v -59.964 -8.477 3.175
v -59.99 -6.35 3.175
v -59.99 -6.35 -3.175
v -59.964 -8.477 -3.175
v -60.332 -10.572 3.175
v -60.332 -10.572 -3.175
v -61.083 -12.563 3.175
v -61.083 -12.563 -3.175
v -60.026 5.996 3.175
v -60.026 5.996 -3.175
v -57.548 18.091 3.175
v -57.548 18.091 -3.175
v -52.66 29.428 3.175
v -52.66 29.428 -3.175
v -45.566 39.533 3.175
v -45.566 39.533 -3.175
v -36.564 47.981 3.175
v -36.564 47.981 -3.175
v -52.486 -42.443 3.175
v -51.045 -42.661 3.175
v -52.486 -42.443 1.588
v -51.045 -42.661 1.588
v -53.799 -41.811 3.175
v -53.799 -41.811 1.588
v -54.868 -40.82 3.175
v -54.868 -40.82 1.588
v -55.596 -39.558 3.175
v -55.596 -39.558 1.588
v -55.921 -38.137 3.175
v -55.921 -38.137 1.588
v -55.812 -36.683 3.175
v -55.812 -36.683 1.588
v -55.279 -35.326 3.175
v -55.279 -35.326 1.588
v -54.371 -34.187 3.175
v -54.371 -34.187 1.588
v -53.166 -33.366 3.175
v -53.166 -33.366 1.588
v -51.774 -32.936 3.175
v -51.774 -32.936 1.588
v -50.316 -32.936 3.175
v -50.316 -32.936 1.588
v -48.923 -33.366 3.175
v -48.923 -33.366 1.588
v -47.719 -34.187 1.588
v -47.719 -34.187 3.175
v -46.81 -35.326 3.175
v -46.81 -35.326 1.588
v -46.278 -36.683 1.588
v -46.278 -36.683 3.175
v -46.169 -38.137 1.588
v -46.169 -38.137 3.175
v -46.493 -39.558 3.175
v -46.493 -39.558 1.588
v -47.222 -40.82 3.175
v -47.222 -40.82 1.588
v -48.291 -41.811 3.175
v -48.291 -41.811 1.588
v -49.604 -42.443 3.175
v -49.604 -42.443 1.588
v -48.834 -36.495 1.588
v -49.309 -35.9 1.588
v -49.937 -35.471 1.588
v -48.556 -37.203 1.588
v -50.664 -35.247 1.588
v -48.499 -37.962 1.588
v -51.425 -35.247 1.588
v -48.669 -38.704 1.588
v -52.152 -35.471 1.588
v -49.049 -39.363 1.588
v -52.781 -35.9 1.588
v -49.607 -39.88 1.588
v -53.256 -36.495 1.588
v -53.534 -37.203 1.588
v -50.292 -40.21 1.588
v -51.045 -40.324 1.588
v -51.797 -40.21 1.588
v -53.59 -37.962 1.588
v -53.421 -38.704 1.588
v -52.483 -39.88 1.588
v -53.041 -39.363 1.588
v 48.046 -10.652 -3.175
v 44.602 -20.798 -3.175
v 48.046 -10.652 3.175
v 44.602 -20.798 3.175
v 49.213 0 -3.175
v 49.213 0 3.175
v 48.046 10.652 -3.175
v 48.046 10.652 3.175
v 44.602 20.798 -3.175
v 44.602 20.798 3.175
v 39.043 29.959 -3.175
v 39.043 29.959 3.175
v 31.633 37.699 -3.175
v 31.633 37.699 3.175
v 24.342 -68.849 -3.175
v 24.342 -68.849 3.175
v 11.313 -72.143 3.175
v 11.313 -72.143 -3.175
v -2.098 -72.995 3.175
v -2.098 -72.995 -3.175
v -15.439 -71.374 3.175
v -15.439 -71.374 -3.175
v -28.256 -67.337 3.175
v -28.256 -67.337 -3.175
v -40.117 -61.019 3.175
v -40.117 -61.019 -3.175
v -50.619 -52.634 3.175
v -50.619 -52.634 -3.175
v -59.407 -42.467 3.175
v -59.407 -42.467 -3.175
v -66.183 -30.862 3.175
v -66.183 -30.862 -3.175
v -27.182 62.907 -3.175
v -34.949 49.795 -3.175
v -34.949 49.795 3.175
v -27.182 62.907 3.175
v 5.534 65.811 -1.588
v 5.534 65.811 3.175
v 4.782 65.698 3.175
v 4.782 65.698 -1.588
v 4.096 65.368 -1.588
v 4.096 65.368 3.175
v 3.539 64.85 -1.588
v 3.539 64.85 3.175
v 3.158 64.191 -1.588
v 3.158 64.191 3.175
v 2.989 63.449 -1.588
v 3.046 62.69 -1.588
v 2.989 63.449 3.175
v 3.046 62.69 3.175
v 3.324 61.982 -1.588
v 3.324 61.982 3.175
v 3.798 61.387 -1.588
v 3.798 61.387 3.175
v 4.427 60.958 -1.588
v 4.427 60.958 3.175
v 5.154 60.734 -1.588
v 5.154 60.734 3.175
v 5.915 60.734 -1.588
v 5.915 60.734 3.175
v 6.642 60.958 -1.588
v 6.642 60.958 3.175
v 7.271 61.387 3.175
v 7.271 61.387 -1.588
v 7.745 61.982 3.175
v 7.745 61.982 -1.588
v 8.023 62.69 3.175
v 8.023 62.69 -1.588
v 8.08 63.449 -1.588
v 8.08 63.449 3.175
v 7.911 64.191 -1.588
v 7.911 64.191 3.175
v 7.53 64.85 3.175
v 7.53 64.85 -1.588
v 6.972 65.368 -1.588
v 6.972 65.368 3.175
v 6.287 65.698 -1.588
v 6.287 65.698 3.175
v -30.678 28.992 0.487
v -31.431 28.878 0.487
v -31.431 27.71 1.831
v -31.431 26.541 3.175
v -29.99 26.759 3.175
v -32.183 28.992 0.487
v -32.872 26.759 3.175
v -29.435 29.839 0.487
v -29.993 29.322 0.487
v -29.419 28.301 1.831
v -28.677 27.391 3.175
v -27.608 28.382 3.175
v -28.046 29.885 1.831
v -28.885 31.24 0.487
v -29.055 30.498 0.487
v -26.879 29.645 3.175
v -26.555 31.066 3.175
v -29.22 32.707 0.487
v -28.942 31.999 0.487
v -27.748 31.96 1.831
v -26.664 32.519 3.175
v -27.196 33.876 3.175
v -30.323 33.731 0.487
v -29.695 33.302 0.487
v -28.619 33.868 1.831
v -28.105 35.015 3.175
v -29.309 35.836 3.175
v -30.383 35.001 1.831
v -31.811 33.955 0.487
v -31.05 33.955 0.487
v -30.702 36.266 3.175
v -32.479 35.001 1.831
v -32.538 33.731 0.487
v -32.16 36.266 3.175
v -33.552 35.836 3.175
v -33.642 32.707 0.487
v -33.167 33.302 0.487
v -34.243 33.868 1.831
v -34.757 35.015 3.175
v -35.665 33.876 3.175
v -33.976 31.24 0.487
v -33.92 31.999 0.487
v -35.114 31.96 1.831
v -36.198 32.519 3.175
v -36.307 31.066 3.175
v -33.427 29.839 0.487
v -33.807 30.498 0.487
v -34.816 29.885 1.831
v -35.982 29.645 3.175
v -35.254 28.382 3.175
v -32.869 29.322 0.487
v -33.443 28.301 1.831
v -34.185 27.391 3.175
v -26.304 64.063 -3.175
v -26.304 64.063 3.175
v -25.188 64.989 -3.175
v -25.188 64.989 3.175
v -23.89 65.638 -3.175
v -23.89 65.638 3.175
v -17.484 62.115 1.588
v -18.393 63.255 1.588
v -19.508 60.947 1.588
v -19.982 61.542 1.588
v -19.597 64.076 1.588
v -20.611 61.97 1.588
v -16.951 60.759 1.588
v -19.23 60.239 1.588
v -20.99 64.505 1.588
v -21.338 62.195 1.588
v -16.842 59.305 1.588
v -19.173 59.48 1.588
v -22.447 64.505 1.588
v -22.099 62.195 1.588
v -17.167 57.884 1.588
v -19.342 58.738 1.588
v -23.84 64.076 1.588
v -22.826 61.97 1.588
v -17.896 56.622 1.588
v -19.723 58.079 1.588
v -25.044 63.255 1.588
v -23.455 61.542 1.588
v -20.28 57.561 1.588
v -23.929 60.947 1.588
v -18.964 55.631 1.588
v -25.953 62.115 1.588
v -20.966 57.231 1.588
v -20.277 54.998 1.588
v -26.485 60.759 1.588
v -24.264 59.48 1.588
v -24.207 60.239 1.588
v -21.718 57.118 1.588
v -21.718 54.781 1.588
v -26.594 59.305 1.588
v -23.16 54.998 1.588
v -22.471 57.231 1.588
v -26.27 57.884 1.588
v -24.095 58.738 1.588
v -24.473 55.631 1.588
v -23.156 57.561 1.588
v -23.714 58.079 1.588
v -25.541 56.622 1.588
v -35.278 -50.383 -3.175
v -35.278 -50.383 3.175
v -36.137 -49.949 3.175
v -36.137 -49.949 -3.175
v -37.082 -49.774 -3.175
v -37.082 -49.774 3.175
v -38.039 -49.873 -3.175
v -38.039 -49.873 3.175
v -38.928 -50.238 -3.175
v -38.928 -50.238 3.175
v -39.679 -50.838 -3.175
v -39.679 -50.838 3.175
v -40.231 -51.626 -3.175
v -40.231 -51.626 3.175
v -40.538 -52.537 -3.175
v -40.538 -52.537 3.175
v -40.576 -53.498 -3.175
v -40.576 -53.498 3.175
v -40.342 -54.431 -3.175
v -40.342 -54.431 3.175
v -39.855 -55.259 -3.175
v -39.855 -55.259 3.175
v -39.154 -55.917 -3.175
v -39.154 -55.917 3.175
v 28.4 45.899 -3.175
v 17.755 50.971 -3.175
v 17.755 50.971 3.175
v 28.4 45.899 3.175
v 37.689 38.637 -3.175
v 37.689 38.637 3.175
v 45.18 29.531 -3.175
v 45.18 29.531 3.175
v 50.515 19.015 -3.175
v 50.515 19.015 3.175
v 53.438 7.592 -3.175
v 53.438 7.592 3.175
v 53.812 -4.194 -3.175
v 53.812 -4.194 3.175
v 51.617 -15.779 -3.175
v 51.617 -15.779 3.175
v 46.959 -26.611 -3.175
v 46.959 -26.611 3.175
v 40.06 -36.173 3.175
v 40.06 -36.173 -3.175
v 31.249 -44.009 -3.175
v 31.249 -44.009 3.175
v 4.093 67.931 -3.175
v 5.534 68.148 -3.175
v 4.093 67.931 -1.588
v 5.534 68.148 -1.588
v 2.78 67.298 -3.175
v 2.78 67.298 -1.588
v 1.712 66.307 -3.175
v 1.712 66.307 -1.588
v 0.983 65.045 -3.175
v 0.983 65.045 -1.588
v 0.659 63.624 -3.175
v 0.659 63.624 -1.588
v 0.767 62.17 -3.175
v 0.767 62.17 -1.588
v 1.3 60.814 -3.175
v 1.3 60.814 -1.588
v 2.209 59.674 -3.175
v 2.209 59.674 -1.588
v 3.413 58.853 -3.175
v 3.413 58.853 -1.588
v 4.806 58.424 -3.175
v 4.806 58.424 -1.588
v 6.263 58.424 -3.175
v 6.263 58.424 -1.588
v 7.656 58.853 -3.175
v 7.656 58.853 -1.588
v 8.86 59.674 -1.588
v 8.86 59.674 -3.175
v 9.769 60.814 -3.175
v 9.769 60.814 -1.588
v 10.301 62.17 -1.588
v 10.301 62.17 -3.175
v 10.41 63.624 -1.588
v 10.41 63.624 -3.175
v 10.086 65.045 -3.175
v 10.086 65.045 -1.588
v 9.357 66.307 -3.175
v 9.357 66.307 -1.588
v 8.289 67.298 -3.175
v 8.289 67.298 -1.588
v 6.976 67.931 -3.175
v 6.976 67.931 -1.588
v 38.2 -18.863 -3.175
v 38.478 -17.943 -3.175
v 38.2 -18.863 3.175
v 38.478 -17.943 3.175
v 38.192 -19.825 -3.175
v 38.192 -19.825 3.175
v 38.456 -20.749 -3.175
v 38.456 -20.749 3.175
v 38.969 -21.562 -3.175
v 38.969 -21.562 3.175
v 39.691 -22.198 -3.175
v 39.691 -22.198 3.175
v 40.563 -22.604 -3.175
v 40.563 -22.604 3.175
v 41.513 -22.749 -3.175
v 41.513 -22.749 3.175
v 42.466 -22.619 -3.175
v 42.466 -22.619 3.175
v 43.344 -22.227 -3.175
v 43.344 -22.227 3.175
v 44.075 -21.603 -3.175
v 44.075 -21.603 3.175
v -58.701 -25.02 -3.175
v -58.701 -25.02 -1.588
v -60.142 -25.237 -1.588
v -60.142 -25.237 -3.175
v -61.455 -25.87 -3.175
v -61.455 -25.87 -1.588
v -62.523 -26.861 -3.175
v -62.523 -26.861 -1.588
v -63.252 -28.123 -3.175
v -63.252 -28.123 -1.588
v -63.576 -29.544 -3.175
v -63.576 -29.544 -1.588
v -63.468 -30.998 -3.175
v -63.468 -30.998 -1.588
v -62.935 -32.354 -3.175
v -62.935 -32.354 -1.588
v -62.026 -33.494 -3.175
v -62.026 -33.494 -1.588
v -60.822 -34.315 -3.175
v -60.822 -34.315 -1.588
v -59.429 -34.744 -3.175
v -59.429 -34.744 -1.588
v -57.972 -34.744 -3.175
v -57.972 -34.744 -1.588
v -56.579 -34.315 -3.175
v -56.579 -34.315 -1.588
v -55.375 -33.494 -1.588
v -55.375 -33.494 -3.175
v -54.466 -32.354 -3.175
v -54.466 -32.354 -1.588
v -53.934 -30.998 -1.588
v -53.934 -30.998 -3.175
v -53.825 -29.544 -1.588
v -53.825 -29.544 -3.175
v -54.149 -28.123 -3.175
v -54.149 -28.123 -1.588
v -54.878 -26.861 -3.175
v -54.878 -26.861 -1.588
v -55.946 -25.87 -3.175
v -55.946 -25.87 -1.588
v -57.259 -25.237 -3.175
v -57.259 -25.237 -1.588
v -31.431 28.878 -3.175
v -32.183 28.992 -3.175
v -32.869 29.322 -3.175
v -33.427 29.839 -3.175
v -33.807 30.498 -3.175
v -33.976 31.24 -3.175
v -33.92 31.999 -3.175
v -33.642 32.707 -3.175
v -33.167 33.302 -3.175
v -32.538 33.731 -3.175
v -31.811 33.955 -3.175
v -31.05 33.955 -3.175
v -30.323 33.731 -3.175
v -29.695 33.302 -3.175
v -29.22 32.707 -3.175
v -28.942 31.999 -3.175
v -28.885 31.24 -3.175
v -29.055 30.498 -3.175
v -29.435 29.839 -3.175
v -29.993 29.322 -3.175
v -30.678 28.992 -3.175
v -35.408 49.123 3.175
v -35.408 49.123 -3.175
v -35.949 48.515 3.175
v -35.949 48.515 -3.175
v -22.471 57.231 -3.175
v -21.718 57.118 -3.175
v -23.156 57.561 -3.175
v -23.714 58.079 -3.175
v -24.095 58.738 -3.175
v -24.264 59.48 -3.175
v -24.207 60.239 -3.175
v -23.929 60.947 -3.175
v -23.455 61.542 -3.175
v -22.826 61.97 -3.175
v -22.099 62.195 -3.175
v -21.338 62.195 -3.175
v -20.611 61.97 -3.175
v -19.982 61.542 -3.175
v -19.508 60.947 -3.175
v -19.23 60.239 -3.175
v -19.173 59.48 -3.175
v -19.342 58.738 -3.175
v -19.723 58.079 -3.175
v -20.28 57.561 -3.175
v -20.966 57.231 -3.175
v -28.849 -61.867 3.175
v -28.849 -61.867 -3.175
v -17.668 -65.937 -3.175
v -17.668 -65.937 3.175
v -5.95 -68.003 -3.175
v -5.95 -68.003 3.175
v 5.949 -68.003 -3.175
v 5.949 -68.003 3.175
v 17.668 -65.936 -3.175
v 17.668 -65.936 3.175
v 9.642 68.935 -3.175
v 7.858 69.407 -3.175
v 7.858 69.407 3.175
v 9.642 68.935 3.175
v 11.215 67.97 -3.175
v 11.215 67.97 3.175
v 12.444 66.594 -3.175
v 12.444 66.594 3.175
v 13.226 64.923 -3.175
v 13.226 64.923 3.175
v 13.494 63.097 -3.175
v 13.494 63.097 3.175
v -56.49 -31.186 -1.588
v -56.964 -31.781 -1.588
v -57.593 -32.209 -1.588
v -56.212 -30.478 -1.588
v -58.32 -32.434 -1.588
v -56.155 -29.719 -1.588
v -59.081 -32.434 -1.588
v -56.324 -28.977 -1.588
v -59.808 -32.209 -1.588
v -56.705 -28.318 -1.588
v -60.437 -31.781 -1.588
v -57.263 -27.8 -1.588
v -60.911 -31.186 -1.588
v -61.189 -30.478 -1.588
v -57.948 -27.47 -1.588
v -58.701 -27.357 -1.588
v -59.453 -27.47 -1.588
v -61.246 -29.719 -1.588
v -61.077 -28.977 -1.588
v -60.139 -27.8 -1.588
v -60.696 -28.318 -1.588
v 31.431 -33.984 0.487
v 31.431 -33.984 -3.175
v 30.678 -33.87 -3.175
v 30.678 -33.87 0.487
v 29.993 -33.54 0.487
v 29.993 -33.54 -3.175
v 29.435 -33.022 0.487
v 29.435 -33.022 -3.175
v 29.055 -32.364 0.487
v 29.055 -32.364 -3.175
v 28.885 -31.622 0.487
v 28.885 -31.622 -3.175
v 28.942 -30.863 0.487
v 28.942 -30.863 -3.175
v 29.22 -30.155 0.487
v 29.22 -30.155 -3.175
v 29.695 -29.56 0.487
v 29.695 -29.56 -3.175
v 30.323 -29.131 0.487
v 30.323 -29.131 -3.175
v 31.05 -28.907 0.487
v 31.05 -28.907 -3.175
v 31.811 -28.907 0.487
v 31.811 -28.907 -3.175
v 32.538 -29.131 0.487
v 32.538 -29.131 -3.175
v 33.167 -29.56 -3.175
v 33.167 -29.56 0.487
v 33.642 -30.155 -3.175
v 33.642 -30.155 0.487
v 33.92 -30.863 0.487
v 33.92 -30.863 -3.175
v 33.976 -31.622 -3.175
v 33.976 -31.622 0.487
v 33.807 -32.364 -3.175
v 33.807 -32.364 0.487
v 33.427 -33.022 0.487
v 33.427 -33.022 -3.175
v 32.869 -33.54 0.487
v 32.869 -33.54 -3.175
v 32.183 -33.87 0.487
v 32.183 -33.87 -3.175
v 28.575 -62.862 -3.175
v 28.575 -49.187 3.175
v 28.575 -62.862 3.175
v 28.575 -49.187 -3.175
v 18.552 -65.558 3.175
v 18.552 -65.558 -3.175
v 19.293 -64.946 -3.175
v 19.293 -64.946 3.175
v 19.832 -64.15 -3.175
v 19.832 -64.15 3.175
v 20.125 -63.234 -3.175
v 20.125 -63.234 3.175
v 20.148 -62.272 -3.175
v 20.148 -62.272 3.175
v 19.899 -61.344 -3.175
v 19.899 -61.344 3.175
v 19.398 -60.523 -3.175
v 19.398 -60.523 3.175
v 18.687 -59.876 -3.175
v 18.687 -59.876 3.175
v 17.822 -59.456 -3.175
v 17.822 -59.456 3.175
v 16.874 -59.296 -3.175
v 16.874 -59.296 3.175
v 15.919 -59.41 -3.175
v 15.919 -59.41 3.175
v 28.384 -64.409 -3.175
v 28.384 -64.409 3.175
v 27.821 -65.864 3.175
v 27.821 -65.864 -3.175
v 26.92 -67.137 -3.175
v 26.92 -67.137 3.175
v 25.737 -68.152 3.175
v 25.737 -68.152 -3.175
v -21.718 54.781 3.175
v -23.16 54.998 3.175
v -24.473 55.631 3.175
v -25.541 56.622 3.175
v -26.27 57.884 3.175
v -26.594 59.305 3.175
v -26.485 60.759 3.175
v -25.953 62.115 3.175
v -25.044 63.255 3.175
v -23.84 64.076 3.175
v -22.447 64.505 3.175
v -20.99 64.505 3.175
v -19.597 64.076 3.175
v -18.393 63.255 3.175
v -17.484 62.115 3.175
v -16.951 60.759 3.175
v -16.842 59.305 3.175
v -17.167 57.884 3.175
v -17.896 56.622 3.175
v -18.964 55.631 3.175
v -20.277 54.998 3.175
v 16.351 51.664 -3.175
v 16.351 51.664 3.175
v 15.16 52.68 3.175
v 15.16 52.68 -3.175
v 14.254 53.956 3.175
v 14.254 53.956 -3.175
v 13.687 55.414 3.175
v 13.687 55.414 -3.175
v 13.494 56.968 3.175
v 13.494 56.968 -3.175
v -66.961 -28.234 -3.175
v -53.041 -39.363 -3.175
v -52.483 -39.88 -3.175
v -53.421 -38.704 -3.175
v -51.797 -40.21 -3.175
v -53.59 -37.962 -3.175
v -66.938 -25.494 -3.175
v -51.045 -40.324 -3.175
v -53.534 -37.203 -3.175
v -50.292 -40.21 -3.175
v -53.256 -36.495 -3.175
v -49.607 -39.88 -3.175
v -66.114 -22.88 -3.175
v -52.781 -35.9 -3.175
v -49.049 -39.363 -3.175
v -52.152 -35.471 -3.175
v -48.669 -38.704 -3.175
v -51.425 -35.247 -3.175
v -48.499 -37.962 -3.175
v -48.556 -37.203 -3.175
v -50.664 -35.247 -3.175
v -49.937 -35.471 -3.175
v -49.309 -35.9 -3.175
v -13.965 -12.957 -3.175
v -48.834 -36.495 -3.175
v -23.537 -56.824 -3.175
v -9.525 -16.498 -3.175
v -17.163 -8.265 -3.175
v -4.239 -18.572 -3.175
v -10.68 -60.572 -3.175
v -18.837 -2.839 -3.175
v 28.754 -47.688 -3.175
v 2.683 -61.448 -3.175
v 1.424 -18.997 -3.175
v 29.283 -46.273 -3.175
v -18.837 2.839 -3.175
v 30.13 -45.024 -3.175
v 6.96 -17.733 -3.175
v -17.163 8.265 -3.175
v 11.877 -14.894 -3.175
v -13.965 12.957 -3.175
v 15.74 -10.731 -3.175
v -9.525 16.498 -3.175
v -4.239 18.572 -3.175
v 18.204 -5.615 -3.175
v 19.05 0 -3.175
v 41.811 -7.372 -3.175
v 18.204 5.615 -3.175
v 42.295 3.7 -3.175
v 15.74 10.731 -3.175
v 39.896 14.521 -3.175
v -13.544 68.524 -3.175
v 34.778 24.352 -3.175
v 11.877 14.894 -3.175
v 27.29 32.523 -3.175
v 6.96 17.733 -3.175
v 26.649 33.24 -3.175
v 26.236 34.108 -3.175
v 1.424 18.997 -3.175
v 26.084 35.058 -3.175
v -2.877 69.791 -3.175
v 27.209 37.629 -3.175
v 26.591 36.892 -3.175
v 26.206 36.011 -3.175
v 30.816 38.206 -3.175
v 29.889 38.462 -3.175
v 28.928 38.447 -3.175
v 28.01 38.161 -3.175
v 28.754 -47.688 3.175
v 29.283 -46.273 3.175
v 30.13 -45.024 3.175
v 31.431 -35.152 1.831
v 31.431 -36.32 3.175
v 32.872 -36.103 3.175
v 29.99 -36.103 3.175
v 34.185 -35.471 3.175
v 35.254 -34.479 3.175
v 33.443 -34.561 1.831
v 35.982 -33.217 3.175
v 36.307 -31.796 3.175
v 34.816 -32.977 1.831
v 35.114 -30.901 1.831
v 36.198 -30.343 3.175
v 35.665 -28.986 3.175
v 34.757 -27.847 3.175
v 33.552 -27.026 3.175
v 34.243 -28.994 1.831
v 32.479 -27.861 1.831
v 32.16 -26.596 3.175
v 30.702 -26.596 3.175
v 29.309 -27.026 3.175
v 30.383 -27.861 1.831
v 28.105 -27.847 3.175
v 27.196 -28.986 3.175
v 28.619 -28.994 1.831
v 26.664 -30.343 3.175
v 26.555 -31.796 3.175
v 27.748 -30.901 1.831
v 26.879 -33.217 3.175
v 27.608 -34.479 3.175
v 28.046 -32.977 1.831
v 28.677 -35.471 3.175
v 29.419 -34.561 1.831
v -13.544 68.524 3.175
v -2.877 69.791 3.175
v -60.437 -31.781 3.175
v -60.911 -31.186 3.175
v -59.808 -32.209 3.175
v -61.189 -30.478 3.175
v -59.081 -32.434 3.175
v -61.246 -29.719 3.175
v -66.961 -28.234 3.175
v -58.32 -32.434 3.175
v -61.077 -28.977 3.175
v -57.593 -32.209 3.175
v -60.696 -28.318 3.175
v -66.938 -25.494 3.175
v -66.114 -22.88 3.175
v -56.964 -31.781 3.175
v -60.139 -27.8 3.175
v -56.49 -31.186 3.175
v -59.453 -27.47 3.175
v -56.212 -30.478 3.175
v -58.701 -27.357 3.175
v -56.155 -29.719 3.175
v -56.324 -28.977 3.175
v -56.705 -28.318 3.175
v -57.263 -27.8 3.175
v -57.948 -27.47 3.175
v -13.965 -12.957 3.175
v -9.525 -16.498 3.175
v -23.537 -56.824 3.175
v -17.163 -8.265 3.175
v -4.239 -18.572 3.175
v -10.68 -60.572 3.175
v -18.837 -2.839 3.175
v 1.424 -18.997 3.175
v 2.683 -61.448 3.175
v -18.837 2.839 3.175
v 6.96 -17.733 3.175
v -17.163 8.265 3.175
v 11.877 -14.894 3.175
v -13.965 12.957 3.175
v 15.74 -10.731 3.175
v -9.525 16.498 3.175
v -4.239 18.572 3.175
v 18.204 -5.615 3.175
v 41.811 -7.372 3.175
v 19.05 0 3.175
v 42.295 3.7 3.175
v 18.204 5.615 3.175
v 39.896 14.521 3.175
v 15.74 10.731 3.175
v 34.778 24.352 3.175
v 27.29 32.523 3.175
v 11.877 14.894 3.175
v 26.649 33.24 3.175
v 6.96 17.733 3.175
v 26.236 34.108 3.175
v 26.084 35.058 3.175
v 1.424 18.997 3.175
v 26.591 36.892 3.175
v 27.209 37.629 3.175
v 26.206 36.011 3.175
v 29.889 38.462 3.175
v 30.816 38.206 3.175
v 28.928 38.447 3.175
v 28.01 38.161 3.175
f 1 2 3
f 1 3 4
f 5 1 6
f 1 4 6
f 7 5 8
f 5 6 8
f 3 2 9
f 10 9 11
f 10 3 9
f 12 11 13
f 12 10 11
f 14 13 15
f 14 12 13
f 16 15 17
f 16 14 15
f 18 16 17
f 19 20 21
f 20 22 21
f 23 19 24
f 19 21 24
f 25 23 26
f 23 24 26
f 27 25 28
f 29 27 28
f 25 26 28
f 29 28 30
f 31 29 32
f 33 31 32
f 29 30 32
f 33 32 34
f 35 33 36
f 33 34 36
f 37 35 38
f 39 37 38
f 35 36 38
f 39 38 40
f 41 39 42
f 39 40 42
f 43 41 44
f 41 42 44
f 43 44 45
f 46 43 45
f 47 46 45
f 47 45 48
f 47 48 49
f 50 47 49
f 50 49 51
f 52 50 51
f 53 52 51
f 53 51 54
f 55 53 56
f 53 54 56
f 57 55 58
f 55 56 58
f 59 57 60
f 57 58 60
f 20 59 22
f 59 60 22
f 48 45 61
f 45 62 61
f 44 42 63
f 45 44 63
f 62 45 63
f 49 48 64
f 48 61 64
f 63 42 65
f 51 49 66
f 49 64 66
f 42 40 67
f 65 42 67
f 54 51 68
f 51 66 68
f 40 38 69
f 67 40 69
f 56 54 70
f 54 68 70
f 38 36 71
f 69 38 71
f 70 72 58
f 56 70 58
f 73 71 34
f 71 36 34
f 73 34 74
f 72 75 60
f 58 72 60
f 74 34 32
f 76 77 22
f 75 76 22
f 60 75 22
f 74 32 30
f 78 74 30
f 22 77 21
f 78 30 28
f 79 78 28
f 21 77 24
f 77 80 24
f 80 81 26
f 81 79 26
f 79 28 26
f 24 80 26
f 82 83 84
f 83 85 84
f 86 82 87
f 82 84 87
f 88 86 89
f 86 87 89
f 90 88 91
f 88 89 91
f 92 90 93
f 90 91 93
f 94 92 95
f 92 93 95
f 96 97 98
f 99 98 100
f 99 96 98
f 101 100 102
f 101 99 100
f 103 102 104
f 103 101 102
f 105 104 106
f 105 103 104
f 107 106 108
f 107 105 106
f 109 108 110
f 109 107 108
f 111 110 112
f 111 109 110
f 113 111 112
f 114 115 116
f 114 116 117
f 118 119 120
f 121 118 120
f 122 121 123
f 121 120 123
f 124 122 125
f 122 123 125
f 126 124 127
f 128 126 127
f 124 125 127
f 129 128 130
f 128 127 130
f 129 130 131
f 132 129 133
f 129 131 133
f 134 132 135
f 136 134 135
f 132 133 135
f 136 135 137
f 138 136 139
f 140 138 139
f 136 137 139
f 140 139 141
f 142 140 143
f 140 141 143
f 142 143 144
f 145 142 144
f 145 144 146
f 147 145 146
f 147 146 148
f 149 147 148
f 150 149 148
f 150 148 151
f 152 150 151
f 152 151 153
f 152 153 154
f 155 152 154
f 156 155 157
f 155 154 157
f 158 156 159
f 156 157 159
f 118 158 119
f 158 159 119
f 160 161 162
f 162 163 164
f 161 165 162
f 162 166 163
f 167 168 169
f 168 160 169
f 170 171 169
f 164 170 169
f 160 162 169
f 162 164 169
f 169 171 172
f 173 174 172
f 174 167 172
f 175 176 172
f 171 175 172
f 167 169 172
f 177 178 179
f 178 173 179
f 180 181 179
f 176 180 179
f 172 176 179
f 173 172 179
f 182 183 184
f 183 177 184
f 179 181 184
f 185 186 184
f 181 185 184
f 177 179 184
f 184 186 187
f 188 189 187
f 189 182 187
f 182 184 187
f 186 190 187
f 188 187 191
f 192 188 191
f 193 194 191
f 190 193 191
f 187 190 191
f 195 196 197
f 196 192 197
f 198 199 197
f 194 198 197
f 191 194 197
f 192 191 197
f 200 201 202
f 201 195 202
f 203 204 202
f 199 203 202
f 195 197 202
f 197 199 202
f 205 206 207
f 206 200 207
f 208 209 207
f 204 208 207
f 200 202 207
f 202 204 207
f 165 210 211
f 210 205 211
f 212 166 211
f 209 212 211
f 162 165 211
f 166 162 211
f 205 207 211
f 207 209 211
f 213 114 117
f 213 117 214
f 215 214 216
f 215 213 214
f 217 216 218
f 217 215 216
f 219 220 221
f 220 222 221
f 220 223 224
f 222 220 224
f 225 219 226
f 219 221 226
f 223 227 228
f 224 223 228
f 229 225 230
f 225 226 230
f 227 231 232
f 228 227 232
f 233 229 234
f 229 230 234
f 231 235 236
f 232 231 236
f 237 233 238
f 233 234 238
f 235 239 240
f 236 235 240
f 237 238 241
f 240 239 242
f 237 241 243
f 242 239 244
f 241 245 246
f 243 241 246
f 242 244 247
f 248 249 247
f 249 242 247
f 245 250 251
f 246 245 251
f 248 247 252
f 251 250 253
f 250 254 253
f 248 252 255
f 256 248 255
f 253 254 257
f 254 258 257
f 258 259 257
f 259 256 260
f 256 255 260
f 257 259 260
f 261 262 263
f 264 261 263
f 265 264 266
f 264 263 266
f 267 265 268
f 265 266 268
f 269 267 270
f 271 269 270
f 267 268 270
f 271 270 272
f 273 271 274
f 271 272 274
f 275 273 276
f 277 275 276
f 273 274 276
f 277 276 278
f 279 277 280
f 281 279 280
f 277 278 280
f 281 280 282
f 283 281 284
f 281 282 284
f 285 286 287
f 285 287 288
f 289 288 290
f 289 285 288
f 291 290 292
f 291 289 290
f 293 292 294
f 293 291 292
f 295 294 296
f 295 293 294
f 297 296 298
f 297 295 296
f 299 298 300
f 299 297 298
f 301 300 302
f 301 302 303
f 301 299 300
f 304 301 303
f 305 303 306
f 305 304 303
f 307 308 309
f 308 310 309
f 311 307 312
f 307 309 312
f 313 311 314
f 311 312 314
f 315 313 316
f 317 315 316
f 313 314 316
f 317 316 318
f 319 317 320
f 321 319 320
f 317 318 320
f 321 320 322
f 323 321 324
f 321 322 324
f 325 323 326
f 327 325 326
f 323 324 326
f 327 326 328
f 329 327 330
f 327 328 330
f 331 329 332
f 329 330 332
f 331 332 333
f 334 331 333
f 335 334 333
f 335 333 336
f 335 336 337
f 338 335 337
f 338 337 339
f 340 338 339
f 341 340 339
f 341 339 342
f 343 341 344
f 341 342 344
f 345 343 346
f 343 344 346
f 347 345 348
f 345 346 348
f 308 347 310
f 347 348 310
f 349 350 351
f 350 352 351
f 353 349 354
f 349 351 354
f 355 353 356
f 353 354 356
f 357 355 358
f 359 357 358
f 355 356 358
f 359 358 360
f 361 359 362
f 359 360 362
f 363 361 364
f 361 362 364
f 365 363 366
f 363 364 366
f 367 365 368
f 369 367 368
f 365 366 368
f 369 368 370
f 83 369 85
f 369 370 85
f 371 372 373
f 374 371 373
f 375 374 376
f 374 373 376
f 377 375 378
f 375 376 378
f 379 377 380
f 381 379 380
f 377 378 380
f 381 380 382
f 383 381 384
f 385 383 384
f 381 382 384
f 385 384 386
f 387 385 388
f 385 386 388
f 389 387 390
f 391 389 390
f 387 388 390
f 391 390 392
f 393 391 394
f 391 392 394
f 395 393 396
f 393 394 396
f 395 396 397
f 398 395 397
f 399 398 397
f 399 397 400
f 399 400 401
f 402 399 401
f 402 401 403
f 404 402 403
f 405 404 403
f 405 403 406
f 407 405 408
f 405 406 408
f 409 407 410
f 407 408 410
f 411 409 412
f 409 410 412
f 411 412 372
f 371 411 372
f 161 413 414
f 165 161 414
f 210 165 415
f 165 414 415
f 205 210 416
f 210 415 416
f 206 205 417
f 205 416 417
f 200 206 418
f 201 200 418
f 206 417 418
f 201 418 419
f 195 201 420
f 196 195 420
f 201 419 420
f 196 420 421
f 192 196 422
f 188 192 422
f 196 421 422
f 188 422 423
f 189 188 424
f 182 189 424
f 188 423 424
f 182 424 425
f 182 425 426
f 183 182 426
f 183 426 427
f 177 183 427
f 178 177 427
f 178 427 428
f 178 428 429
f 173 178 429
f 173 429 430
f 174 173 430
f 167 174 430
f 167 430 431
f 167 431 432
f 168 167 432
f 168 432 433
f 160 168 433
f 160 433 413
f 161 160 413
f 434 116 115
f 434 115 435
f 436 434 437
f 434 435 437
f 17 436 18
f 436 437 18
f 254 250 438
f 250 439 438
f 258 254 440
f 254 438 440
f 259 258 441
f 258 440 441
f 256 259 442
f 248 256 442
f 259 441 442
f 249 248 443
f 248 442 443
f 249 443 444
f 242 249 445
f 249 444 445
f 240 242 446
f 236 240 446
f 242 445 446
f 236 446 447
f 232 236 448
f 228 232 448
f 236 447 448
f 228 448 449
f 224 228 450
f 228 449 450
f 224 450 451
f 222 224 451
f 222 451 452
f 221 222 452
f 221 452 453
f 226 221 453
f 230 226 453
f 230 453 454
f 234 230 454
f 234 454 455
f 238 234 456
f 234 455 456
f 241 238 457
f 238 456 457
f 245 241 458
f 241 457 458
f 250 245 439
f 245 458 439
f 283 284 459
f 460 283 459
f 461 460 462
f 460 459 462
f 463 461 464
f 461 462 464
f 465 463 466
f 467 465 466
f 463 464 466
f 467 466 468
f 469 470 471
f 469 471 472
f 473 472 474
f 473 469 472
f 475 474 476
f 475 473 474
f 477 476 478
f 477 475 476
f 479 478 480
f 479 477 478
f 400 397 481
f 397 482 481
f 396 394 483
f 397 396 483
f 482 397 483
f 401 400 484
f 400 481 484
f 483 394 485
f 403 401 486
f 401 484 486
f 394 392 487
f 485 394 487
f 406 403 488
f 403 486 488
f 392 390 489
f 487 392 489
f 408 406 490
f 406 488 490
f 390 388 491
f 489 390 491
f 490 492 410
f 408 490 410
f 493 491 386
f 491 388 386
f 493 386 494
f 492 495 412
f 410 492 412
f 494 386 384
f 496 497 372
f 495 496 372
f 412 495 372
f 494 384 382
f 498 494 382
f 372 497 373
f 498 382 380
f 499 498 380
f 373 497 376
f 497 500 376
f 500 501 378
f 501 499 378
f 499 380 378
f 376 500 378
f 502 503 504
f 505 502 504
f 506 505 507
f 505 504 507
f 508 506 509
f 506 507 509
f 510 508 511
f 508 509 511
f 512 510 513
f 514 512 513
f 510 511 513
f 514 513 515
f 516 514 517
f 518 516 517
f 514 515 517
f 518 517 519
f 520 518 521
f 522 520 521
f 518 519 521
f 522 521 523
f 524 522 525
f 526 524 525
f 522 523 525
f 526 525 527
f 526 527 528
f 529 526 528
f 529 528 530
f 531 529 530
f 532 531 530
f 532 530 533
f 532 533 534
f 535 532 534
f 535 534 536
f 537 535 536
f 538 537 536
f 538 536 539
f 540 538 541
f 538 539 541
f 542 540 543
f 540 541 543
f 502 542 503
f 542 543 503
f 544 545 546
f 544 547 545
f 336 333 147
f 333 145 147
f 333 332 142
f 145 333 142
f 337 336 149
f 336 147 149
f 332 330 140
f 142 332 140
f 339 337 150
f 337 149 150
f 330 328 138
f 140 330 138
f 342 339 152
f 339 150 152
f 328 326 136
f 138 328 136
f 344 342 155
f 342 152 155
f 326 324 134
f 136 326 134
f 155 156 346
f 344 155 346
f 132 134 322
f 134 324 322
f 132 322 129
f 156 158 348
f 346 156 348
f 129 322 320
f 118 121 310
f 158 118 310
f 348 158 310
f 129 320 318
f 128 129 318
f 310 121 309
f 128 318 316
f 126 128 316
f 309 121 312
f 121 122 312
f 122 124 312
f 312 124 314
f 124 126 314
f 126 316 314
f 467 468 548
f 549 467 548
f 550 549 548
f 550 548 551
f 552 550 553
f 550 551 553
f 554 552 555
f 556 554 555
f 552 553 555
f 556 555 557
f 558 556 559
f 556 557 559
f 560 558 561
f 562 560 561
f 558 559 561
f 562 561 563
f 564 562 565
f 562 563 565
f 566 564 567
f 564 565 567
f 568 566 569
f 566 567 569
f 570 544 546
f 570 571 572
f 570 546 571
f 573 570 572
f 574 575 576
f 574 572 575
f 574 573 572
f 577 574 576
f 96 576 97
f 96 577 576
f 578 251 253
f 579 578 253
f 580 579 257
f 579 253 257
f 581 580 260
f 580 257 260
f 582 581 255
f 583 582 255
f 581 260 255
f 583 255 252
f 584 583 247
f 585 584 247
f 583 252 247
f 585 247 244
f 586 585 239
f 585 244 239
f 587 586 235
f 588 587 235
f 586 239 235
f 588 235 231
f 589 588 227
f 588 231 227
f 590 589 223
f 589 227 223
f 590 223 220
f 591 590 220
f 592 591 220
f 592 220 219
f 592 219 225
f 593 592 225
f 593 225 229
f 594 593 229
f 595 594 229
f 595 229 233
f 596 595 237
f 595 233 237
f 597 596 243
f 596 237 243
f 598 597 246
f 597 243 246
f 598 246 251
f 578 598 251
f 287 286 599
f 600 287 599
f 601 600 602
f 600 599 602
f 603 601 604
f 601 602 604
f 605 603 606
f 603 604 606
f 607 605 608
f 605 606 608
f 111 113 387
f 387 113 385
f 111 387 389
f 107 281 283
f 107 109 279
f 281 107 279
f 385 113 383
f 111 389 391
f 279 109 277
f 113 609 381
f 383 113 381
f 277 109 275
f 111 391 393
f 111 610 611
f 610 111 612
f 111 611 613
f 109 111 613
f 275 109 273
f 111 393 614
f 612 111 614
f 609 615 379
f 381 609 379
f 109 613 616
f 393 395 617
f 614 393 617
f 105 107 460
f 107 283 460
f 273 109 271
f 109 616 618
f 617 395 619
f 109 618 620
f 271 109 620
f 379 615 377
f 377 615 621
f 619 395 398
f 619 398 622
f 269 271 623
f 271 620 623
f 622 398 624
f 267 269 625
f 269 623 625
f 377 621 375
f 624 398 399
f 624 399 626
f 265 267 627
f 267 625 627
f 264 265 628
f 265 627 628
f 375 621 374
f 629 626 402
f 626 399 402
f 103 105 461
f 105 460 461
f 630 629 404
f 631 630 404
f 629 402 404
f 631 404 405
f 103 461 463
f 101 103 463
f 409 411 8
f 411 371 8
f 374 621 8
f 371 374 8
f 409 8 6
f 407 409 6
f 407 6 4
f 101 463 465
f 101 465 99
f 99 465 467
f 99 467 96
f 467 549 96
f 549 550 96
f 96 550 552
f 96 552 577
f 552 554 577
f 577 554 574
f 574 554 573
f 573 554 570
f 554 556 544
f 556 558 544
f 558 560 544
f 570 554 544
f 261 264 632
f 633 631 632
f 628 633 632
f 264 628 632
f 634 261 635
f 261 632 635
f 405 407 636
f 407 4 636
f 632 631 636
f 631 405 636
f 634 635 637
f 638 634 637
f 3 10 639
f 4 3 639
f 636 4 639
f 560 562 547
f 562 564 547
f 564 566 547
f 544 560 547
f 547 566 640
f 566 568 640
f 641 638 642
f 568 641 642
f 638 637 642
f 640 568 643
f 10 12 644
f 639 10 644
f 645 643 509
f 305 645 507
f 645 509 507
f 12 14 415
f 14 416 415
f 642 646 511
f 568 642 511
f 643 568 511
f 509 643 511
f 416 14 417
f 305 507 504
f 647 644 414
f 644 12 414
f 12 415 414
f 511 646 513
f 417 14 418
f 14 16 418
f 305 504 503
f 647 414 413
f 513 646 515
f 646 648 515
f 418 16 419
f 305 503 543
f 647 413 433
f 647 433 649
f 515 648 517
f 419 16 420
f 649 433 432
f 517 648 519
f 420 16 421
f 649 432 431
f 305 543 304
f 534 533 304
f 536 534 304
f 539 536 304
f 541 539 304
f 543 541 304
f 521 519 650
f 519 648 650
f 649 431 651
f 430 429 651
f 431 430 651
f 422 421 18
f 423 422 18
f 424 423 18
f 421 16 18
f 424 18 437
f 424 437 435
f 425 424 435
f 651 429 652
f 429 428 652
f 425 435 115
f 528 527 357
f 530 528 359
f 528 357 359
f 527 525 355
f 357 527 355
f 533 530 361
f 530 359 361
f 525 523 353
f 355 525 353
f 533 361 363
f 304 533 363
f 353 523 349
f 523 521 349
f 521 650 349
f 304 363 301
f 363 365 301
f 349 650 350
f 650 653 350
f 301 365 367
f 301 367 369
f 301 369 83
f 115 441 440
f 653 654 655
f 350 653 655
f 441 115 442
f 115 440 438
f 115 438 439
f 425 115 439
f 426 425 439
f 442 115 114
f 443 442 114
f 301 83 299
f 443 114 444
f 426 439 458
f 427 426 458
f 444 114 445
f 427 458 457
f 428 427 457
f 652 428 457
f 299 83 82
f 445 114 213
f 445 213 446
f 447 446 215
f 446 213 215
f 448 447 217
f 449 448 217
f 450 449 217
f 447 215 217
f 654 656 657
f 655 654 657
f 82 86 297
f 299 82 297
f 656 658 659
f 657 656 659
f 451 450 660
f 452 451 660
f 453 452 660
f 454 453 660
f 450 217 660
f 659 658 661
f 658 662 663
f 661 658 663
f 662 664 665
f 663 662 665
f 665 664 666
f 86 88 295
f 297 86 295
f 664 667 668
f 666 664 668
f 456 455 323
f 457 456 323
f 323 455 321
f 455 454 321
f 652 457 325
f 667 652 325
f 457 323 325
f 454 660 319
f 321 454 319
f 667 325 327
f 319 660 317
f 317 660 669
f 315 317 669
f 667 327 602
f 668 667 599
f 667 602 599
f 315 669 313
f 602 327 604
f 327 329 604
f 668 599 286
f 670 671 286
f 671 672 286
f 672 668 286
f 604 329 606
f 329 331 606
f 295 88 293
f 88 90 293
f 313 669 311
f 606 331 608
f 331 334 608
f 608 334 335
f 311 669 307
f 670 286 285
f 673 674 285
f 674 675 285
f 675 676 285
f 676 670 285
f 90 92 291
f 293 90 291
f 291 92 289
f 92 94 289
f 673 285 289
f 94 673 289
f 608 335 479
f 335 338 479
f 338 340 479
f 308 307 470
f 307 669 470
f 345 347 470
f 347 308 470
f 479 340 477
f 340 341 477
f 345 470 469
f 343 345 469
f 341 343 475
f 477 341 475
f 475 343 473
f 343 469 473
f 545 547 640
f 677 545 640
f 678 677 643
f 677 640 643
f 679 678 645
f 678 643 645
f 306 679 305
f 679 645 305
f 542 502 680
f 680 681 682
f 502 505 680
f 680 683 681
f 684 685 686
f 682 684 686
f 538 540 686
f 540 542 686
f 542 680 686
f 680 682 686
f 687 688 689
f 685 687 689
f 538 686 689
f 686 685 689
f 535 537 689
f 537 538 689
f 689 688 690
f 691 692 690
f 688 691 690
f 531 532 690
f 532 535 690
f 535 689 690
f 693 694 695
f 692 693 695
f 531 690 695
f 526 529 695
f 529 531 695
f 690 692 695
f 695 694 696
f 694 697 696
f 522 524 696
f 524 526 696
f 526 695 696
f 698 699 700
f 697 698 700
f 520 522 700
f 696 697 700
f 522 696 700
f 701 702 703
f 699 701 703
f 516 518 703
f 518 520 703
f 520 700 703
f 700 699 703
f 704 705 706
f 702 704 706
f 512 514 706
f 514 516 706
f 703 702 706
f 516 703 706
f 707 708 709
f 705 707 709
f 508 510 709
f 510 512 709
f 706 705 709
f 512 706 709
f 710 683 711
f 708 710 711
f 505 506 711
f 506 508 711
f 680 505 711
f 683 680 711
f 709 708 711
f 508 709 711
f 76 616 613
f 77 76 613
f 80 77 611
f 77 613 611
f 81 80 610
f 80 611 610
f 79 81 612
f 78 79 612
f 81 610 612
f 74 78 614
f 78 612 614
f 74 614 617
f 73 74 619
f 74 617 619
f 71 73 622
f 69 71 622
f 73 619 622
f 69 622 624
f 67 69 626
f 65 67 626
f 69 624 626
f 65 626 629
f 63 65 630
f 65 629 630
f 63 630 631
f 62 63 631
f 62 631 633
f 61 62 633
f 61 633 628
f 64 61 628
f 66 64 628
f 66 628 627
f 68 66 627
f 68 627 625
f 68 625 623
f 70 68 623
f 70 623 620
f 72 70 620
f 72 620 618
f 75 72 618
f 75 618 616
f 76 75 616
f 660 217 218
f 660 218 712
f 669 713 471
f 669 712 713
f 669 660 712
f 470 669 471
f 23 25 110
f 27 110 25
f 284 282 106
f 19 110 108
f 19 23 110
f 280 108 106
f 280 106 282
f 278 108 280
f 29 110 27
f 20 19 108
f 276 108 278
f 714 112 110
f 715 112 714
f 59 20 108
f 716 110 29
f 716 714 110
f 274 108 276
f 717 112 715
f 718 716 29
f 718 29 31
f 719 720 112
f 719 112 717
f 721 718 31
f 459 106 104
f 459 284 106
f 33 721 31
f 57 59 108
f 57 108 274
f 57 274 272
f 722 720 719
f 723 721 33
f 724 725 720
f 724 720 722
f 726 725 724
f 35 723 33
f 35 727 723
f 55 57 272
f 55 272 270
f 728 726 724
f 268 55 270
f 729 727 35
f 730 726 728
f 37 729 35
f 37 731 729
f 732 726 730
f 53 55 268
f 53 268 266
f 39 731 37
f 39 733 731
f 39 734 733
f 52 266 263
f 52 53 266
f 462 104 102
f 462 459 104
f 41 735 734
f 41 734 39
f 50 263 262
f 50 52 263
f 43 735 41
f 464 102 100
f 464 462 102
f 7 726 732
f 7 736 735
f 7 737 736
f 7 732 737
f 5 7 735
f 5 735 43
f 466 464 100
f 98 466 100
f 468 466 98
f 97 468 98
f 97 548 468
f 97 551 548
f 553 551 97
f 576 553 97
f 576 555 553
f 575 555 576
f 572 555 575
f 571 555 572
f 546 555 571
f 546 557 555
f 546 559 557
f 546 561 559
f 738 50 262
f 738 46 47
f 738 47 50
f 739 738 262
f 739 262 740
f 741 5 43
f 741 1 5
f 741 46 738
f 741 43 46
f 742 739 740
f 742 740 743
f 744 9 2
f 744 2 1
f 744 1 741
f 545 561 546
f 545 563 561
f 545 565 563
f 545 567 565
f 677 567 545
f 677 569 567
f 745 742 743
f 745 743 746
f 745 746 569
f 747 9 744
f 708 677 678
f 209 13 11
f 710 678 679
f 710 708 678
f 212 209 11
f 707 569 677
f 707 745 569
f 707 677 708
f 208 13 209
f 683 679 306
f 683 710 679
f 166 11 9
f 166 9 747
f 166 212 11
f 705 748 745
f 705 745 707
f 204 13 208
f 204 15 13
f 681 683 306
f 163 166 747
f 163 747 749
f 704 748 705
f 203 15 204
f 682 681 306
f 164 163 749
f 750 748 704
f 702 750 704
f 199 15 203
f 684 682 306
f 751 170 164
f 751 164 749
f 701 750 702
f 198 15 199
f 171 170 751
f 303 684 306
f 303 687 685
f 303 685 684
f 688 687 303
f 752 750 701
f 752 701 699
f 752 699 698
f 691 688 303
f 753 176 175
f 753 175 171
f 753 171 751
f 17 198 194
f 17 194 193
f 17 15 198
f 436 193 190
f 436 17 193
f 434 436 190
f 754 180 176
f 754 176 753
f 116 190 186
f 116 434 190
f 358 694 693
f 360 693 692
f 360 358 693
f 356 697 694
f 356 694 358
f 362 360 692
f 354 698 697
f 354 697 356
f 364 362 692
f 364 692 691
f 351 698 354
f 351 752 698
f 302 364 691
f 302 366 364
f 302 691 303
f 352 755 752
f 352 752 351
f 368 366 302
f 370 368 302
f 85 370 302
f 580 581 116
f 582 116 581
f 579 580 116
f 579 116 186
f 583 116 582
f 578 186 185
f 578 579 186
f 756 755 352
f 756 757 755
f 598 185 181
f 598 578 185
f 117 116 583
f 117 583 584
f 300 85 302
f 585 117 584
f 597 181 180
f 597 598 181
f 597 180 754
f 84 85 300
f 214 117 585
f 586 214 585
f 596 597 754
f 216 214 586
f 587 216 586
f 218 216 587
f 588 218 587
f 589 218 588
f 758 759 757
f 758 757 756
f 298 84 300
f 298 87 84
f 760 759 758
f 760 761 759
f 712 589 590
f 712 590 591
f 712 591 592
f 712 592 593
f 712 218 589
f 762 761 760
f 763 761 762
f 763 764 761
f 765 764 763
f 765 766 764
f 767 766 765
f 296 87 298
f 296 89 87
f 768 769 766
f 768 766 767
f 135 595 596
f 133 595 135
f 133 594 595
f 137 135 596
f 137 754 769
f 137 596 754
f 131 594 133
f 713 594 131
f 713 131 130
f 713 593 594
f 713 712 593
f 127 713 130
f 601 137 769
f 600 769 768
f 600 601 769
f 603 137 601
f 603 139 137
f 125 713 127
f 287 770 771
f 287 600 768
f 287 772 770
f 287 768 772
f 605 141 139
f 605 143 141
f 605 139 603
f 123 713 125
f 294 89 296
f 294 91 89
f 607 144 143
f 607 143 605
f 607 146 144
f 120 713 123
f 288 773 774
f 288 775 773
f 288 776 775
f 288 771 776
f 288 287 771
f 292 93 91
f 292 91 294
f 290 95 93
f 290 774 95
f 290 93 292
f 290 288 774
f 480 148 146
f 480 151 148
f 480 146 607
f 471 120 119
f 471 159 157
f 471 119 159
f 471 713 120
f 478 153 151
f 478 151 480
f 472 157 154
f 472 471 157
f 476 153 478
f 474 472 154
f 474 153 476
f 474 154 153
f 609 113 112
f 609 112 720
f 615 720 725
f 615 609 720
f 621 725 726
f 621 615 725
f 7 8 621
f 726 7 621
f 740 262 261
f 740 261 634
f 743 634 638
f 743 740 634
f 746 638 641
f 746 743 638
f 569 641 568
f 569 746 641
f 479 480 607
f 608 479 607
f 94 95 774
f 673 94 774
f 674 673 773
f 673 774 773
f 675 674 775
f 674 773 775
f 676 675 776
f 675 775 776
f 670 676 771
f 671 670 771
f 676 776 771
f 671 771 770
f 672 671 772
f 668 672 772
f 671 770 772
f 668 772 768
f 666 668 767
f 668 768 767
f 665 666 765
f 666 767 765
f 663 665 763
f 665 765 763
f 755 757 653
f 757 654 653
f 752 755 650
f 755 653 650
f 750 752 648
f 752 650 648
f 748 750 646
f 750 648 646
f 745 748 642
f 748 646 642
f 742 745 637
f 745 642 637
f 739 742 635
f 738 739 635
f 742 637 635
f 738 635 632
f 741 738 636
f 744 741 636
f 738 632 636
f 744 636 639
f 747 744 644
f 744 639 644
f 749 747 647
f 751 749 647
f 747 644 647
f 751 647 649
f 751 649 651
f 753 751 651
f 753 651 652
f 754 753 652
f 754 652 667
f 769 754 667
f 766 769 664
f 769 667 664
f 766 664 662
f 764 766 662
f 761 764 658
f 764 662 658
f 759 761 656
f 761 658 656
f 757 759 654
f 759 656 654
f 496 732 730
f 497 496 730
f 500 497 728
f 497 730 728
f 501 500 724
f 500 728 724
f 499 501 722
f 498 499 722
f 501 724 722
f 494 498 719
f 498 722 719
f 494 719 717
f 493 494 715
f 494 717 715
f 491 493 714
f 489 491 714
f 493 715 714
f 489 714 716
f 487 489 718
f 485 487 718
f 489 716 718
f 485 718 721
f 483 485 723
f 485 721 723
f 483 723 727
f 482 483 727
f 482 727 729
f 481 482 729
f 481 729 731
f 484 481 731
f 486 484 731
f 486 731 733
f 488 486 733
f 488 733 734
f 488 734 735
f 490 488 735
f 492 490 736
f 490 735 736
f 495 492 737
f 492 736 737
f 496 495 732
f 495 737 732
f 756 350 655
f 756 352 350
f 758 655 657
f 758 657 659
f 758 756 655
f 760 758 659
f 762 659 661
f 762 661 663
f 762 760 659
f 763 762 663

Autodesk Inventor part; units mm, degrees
ref_plane "YZ Plane" through (0, 0, 0) normal (1, 0, 0) x (0, 1, 0)
ref_plane "XZ Plane" through (0, 0, 0) normal (0, 1, 0) x (-1, 0, 0)
ref_plane "XY Plane" through (0, 0, 0) normal (0, 0, 1) x (1, 0, 0)
sketch "Sketch1" plane through (0, 0, 0) normal (0, 0, 1) x (1, 0, 0)
  circle A0 centre (0, 0) radius 53.975 construction
  circle A1 centre (0, 0) radius 19.05
  line L0 (-100.2597, 0) -> (86.9261, 0) projected
  line L1 (0, -117.8456) -> (0, 102.763) projected
  line L2 (13.4938, 63.0969) -> (13.4937, 56.9678)
  arc A2 (-66.1831, -30.8617) -> (24.3417, -68.8486) centre (0, 0) ccw
  arc A3 (7.8581, 69.4066) -> (-23.8901, 65.6375) centre (0, 0) ccw
  arc A4 (31.2487, -44.0093) -> (17.7549, 50.9712) centre (0, 0) ccw
  arc A5 (13.4937, 56.9678) -> (17.7549, 50.9712) centre (19.8438, 56.9678) ccw
  arc A6 (13.4938, 63.0969) -> (7.8581, 69.4066) centre (7.1437, 63.0969) ccw
  line L3 (28.575, -49.1869) -> (28.575, -62.8618)
  arc A7 (24.3417, -68.8486) -> (28.575, -62.8618) centre (22.225, -62.8618) ccw
  arc A8 (31.2487, -44.0093) -> (28.575, -49.1869) centre (34.925, -49.1869) ccw
  line L4 (-61.0828, -12.5629) -> (-66.1138, -22.8801)
  arc A9 (-66.1138, -22.8801) -> (-66.1831, -30.8617) centre (-57.7807, -26.9436) ccw
  line L5 (0, 0) -> (-57.7807, -26.9436) construction
  arc A10 (-36.5638, 47.9812) -> (-59.9899, -6.35) centre (0, 0) ccw
  arc A11 (-61.0828, -12.5629) -> (-59.9899, -6.35) centre (-71.3564, -7.5532) ccw
  line L6 (-34.9493, 49.7953) -> (-27.1815, 62.9071)
  arc A12 (-36.5638, 47.9812) -> (-34.9493, 49.7953) centre (-40.4126, 53.0319) ccw
  arc A13 (-23.8901, 65.6375) -> (-27.1815, 62.9071) centre (-21.7183, 59.6705) ccw
  line L7 (0, 0) -> (-21.7183, 59.6705) construction
  point P0 (13.4937, 68.5342)
  point P1 (28.575, -45.7905)
  point P2 (28.575, -67.2021)
  point P3 (-67.9722, -26.6913)
  point P4 (-53.975, 0)
  dimension "d0" = 107.95
  dimension "d10" = 38.1
  dimension "d48" = 6.35
  dimension "d58" = 6.35
  dimension "d59" = 28.575
  dimension "d60" = 73.025
  dimension "d75" = 65
  dimension "d86" = 60.325
  dimension "d88" = 6.35
  dimension "d91" = 6.35
  dimension "d92" = 69.85
  dimension "d119" = 11.43
  dimension "d120" = 9.271
  dimension "d123" = 13.4938
  dimension "d124" = 20
  dimension "d126" = 15.24
extrude "Base" add sketch "Sketch1" along normal mid plane 6.35 contours L0 A4 A8 L3 A7 A2 L1 A1 | A1 L1 A3 A6 L2 A5 A4 L0 | A1 L0 A10 A12 L6 A13 A3 L1 | L1 A2 A9 L4 A11 A10 L0 A1
sketch "Sketch5" plane through (0, 0, 3.175) normal (0, 0, 1) x (1, 0, 0)
  circle A0 centre (0, 0) radius 19.05 projected
  arc A1 (31.2487, -44.0093) -> (17.7549, 50.9712) centre (0, 0) ccw projected
  line L0 (-100.2597, 0) -> (86.9261, 0) projected
  line L1 (0, -117.5661) -> (0, 101.086) projected
  line L2 (0, 0) -> (-31.4309, 31.4309) construction
  arc A2 (-66.1831, -30.8617) -> (24.3417, -68.8486) centre (0, 0) ccw projected
  line L3 (31.4309, -31.4309) -> (0, 0) construction
  dimension "d49" = 45
  dimension "d50" = 44.45
  dimension "d109" = 44.45
hole "Motor Mount Hole" at (-31.4309, 31.4309, 3.175) at (31.4309, -31.4309, 3.175) direction (0, 0, -1) diameter 5.1054 end through all countersink diameter 9.779 countersink angle 82 clearance for "Flat Head Machine Screw (82)" size "#10" standard "Ansi Unified Screw Threads"
sketch "Sketch6" plane through (0, 0, 3.175) normal (0, 0, 1) x (1, 0, 0)
  arc A0 (-66.1831, -30.8617) -> (24.3417, -68.8486) centre (0, 0) ccw projected
  line L0 (-99.0177, 0) -> (79.4738, 0) projected
  line L1 (0, -117.5661) -> (0, 101.086) projected
  line L2 (0, 0) -> (-21.7183, 59.6705) construction
  arc A1 (-36.5638, 47.9812) -> (-59.9899, -6.35) centre (0, 0) ccw projected
  line L3 (-51.0449, -37.7712) -> (0, 0) construction
  dimension "d114" = 63.5
  dimension "d121" = 63.5
  dimension "d122" = 53.5
  dimension "d127" = 20
hole "Standoffs holes to front plate" at (-51.0449, -37.7712, 3.175) at (-21.7183, 59.6705, 3.175) direction (0, 0, -1) diameter 5.1054 end through all counterbore diameter 9.779 counterbore depth 1.5875 clearance for "Flat Head Machine Screw (82)" size "#10" standard "Ansi Unified Screw Threads"
sketch "Sketch8" plane through (0, 0, -3.175) normal (0, 0, -1) x (-1, 0, 0)
  arc A0 (23.8901, 65.6375) -> (-7.8581, 69.4066) centre (0, 0) ccw projected
  line L0 (91.3248, 0) -> (-78.1916, 0) projected
  line L1 (0, -101.8795) -> (0, 100.1019) projected
  line L2 (0, 0) -> (-5.5344, 63.2584) construction
  arc A1 (59.9899, -6.35) -> (36.5638, 47.9812) centre (0, 0) ccw projected
  line L3 (0, 0) -> (58.7006, -29.9095) construction
  point P0 (54.0079, -0.6455)
  dimension "d103" = 63.5
  dimension "d104" = 5
  dimension "d110" = 27
  dimension "d111" = 65.8812
hole "Standoff holes to back plate" at (-58.7006, -29.9095, -3.175) at (5.5344, 63.2584, -3.175) direction (0, 0, 1) diameter 5.1054 end through all counterbore diameter 9.779 counterbore depth 1.5875 clearance for "Flat Head Machine Screw (82)" size "#10" standard "Ansi Unified Screw Threads"
sketch "Sketch7" plane through (0, 0, 3.175) normal (0, 0, 1) x (1, 0, 0)
  arc A0 (-66.1831, -30.8617) -> (24.3417, -68.8486) centre (0, 0) ccw projected
  arc A1 (31.2487, -44.0093) -> (17.7549, 50.9712) centre (0, 0) ccw projected
  arc A2 (-35.2784, -50.3828) -> (-39.1538, -55.9174) centre (-37.2161, -53.1501) ccw
  arc A3 (17.6676, -65.9365) -> (15.919, -59.4103) centre (16.7933, -62.6734) ccw
  arc A4 (-35.2784, -50.3828) -> (15.919, -59.4103) centre (0, 0) ccw
  arc A5 (-39.1538, -55.9174) -> (17.6676, -65.9365) centre (0, 0) ccw
  line L0 (-100.2597, 0) -> (86.9261, 0) projected
  line L1 (0, -117.5661) -> (0, 101.086) projected
  line L2 (16.7933, -62.6734) -> (0, 0) construction
  line L3 (0, 0) -> (-37.2161, -53.1501) construction
  dimension "d69" = 4.7625
  dimension "d70" = 6.7564
  dimension "d71" = 75
  dimension "d72" = 55
extrude "Tensioning Slot" cut sketch "Sketch7" against normal through all
sketch "Sketch10" plane through (0, 0, 3.175) normal (0, 0, 1) x (1, 0, 0)
  arc A0 (31.2487, -44.0093) -> (17.7549, 50.9712) centre (0, 0) ccw projected
  arc A1 (-66.1831, -30.8617) -> (24.3417, -68.8486) centre (0, 0) ccw projected
  line L0 (-100.2597, 0) -> (86.9261, 0) projected
  line L1 (0, -117.5661) -> (0, 101.086) projected
  arc A2 (31.6332, 37.699) -> (27.2903, 32.5233) centre (29.4617, 35.1111) ccw
  arc A3 (38.4783, -17.9427) -> (44.6017, -20.7981) centre (41.54, -19.3704) ccw
  line L2 (0, 0) -> (29.4617, 35.1111) construction
  arc A4 (44.6017, -20.7981) -> (31.6332, 37.699) centre (0, 0) ccw
  arc A5 (38.4783, -17.9427) -> (27.2903, 32.5233) centre (0, 0) ccw
  line L3 (41.54, -19.3704) -> (0, 0) construction
  dimension "d130" = 4.7625
  dimension "d131" = 6.7564
  dimension "d134" = 75
  dimension "d135" = 25
extrude "Tensioning Slot to vertical" cut sketch "Sketch10" against normal through all
properties part number "motor plate"
